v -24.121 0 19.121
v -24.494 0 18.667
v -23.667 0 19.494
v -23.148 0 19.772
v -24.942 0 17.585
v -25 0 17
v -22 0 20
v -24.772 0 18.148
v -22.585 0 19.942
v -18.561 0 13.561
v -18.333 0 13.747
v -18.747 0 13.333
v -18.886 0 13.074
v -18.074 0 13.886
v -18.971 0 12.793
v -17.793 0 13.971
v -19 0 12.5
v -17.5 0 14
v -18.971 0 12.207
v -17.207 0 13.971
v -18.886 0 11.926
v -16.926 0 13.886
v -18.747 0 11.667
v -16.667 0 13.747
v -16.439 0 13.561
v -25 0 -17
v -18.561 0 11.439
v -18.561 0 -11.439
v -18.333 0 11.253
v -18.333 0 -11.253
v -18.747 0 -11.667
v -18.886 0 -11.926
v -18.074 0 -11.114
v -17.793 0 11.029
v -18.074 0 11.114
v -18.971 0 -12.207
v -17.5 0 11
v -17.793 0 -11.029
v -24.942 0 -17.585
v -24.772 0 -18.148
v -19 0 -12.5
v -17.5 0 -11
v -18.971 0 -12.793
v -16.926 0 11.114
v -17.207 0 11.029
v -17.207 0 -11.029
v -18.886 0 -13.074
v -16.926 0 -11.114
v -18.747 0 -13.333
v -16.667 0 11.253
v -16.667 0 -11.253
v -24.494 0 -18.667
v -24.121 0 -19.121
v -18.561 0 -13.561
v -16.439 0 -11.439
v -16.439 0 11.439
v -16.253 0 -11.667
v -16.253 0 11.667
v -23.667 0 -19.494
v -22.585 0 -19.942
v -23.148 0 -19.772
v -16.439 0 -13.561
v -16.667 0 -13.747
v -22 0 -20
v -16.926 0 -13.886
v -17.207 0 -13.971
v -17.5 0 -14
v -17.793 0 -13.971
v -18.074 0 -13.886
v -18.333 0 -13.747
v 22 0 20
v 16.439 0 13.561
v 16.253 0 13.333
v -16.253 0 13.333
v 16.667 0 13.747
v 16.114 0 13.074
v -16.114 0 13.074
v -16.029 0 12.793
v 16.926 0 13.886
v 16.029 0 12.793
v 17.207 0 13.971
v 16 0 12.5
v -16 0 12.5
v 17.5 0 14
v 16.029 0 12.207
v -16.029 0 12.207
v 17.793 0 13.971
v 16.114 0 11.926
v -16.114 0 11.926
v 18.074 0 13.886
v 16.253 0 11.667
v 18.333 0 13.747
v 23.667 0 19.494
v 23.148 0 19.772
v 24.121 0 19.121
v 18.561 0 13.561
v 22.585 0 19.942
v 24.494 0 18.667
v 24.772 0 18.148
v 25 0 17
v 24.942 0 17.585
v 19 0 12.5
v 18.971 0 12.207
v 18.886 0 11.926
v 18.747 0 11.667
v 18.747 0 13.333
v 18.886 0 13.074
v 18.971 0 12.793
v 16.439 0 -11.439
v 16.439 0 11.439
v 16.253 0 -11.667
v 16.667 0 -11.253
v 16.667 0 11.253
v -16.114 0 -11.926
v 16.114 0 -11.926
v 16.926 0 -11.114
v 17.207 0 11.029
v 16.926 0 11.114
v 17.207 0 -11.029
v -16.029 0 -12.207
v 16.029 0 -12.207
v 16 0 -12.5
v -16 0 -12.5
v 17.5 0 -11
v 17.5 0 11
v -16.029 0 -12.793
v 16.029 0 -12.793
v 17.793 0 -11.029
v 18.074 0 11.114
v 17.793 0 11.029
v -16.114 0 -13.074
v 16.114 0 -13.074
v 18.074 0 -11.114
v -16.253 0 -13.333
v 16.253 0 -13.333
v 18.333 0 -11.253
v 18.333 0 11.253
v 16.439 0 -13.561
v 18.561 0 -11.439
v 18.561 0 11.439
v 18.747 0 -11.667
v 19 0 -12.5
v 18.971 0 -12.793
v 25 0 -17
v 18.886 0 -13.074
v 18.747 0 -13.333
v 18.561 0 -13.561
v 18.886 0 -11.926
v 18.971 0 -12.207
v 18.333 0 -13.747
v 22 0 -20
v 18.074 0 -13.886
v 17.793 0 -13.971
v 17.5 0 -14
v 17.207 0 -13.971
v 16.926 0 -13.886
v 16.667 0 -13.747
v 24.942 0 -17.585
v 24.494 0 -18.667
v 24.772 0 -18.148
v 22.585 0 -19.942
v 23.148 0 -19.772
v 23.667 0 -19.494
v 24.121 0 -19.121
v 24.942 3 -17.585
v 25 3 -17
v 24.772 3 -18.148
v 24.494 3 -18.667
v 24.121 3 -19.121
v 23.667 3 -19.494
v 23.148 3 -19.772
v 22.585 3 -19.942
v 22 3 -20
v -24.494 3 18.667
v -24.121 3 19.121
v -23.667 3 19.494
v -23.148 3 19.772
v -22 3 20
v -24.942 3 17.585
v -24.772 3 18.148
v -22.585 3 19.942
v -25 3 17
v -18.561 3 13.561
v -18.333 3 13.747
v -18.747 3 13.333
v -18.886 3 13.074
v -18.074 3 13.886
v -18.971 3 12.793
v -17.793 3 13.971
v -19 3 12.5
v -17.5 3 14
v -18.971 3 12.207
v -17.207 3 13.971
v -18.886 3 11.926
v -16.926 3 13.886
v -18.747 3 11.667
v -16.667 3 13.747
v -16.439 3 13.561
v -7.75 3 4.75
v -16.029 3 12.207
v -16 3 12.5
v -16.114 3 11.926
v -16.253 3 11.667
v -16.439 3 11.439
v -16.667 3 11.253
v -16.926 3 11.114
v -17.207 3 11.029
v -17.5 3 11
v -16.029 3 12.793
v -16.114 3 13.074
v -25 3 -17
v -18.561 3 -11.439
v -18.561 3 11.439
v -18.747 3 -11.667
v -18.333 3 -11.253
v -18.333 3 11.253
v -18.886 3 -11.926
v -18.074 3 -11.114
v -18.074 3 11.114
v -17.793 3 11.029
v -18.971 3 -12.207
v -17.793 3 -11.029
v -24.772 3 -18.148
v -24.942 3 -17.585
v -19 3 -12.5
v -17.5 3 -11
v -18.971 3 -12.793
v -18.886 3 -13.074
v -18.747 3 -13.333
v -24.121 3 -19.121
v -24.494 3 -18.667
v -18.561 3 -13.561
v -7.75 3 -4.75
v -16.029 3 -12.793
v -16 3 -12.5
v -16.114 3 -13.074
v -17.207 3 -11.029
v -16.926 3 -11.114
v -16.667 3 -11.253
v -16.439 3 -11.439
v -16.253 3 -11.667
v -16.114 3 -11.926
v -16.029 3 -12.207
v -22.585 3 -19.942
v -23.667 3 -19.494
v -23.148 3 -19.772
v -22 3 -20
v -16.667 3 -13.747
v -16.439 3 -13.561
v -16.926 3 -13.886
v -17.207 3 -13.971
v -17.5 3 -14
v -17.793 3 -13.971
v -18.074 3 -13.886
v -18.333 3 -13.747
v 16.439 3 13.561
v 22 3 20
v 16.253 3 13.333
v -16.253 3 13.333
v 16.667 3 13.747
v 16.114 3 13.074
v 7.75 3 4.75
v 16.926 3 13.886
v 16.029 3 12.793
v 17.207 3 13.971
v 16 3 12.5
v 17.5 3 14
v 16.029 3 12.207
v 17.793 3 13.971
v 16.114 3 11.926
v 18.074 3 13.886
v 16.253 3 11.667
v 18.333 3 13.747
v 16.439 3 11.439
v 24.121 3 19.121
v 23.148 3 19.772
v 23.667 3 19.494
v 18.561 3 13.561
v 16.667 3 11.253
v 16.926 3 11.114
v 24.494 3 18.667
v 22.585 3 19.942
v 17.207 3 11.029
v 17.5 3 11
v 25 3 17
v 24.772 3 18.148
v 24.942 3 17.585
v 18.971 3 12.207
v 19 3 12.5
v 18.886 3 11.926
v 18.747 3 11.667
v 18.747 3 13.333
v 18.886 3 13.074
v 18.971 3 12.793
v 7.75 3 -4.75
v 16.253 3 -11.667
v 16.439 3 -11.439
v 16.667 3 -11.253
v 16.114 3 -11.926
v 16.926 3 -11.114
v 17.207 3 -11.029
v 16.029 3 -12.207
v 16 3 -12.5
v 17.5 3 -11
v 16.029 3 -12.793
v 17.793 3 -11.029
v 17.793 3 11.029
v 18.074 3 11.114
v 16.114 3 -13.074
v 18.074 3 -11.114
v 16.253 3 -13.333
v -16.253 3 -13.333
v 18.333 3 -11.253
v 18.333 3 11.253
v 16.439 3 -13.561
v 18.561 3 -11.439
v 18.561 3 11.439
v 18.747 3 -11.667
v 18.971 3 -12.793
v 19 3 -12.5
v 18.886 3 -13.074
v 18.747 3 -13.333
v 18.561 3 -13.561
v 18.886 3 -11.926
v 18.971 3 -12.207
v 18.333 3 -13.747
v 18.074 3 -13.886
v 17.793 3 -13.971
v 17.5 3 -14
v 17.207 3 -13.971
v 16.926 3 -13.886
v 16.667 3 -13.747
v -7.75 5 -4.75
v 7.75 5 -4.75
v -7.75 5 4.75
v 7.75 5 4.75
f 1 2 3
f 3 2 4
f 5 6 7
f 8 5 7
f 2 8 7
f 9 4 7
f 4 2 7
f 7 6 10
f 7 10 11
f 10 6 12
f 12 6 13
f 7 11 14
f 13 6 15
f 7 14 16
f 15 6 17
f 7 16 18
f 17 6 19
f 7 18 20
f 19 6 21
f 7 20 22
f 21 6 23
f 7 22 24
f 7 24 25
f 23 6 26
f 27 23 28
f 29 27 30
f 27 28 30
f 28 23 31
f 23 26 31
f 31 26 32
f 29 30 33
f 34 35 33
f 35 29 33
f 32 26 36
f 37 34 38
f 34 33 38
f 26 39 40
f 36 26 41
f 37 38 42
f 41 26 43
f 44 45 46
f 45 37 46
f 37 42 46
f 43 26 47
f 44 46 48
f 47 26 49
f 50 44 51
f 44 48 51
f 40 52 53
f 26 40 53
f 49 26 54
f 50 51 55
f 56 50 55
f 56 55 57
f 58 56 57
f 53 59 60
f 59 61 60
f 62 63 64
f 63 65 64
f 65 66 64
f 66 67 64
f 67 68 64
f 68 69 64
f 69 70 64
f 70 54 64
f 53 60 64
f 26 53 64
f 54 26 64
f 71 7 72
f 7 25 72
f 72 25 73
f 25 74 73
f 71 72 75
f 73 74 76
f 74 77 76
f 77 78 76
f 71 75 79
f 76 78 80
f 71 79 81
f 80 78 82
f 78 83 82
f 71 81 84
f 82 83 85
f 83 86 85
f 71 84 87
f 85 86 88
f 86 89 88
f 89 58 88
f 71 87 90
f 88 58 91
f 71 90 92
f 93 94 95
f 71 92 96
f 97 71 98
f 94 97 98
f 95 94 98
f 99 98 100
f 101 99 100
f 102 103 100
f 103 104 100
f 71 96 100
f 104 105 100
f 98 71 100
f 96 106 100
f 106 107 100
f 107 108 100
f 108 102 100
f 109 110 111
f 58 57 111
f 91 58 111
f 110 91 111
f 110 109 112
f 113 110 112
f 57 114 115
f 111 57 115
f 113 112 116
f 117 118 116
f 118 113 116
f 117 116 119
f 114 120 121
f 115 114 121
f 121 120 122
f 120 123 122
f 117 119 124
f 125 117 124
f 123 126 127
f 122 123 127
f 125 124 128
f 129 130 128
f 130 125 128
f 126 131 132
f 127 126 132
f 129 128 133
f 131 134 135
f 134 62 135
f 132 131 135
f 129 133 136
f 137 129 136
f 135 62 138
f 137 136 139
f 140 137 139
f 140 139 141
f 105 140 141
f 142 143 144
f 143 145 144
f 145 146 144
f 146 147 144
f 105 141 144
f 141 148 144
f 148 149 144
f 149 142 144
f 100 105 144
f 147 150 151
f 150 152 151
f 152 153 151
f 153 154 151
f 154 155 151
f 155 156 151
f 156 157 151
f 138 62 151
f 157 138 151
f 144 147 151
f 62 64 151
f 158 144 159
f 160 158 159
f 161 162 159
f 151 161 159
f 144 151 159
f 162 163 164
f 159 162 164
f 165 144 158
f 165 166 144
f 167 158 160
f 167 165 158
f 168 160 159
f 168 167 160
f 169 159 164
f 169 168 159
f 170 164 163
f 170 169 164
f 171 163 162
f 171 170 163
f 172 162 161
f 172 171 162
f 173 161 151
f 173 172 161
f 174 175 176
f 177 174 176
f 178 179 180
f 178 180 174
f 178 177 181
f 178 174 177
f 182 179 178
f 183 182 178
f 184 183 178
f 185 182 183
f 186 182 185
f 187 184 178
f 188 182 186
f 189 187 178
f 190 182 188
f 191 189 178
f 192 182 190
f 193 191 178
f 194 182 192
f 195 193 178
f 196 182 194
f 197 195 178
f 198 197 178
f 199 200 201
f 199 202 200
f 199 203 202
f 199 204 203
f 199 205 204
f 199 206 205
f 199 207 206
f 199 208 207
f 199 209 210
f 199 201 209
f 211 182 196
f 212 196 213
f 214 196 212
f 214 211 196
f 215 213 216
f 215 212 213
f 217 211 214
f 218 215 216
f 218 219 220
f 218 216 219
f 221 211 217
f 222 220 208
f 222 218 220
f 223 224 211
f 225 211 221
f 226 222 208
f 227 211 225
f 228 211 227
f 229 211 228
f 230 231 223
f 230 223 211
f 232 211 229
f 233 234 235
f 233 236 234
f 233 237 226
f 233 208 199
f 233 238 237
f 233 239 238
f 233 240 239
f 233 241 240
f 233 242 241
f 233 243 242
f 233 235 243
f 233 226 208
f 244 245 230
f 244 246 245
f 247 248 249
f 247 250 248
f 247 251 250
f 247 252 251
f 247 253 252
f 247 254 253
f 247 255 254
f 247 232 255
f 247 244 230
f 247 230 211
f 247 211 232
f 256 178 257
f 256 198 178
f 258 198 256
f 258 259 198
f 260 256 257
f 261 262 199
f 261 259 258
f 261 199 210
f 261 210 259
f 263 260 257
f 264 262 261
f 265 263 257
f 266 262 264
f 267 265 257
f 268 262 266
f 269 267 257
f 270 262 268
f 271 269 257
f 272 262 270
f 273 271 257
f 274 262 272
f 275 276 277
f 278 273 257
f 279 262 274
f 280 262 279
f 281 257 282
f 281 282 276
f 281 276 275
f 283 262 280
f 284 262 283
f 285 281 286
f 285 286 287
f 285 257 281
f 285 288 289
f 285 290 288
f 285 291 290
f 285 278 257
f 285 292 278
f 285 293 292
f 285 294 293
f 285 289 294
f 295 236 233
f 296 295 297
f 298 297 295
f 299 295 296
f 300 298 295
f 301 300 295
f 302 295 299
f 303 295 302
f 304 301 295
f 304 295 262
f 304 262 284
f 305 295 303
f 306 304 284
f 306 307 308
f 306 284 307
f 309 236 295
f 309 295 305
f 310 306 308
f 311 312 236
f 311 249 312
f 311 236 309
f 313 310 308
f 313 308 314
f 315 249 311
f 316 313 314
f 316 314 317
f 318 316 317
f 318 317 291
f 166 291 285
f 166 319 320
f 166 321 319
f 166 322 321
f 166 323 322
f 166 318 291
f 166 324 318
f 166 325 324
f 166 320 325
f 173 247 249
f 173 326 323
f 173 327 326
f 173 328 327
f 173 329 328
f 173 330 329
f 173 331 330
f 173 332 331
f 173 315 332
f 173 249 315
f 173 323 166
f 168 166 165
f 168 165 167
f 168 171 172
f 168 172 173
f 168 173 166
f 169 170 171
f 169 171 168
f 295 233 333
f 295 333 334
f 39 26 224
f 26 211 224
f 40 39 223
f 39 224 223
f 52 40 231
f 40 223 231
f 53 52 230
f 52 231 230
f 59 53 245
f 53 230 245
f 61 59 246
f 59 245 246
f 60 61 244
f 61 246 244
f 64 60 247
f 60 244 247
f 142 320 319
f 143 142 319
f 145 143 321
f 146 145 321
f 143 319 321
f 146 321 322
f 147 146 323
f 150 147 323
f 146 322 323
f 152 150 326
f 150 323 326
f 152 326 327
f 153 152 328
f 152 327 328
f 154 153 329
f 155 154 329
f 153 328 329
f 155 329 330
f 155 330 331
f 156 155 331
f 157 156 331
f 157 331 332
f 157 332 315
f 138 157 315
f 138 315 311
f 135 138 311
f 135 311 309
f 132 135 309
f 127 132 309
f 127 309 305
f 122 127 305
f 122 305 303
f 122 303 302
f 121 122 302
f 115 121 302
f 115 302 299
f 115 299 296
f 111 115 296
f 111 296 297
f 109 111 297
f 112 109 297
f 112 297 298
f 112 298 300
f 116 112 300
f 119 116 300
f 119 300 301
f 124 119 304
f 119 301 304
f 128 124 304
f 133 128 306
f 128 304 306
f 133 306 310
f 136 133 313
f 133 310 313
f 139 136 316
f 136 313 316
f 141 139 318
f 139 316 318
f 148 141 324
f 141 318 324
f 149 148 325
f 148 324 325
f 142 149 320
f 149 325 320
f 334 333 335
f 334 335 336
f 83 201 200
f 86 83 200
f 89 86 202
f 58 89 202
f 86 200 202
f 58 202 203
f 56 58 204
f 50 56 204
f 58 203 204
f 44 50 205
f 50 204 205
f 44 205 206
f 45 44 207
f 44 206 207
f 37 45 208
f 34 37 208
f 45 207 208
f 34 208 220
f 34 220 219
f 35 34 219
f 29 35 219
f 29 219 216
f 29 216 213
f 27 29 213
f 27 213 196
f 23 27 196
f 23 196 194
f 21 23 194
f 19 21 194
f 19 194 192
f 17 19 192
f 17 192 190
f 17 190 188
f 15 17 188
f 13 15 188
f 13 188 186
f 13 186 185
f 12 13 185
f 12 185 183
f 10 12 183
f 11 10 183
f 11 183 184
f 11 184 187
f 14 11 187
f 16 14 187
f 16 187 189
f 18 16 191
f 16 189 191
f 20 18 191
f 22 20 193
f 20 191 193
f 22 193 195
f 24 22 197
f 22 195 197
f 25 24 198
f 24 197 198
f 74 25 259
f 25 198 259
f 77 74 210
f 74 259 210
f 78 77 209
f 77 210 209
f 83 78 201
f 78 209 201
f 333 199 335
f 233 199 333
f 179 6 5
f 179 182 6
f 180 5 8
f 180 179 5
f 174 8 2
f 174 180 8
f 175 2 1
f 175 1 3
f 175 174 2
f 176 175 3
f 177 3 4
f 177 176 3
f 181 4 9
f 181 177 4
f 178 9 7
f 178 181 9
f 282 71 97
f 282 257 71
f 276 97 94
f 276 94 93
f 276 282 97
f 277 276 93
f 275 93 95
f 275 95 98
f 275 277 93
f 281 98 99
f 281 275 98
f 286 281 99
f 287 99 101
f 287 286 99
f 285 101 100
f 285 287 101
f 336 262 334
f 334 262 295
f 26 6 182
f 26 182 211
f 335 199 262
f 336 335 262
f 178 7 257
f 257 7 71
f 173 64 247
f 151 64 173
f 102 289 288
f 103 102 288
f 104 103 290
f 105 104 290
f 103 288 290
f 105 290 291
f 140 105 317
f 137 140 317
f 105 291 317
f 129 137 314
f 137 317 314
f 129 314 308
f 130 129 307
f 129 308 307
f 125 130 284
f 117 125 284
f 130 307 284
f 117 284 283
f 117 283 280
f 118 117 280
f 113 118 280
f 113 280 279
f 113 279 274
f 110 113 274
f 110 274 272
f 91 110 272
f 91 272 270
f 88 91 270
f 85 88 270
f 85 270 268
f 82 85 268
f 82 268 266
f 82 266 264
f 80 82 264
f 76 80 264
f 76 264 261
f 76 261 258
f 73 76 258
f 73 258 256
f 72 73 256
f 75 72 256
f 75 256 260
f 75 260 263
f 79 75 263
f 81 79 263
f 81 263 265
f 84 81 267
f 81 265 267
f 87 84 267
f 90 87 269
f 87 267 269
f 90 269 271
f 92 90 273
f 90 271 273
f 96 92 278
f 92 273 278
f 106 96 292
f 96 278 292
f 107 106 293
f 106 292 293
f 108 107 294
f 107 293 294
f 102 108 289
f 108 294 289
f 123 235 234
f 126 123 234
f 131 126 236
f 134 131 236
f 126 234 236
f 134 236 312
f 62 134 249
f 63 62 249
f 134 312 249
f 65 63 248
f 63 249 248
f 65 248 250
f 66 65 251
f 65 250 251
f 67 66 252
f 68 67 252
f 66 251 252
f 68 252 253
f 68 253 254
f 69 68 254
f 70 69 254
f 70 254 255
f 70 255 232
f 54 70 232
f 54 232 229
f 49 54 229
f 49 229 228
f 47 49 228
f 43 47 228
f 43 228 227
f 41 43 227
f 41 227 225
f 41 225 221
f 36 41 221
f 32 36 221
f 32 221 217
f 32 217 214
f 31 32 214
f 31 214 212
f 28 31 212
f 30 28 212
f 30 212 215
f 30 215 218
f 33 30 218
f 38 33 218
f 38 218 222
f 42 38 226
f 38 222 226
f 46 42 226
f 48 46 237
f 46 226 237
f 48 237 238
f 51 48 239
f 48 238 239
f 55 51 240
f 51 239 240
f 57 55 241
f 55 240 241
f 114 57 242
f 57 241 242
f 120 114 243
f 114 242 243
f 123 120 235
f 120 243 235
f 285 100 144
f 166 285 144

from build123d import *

# Parameters (mm, degrees)
SKETCH1_W     = 50
SKETCH1_H     = 40
BODY_DEPTH    = 3
FILLET_BODY_R = 3
SKETCH2_R     = 1.5
BOLTS_DEPTH   = 9
SKETCH3_W     = 15.5
SKETCH3_H     = 9.5
CHANNEL_DEPTH = 2


with BuildPart() as part:
    # Sketch1 → Body (new body)
    with BuildSketch(Plane(origin=(0, 0, 0), x_dir=(1, 0, 0), z_dir=(0, 1, 0))):
        Rectangle(SKETCH1_W, SKETCH1_H)
    extrude(amount=BODY_DEPTH)

    # Fillet_Body
    fillet_body_edges = [part.edges().sort_by_distance(p)[0] for p in [
        (-25, 1.5, -20),
        (25, 1.5, -20),
        (25, 1.5, 20),
        (-25, 1.5, 20),
    ]]
    fillet(fillet_body_edges, radius=FILLET_BODY_R)

    # Sketch2 → Bolts (cut)
    with BuildSketch(Plane(origin=(0, 3, 0), x_dir=(1, 0, 0), z_dir=(0, 1, 0))):
        with Locations((-17.5, 12.5)):
            Circle(SKETCH2_R)
        with Locations((17.5, 12.5)):
            Circle(SKETCH2_R)
        with Locations((17.5, -12.5)):
            Circle(SKETCH2_R)
        with Locations((-17.5, -12.5)):
            Circle(SKETCH2_R)
    extrude(amount=-BOLTS_DEPTH, mode=Mode.SUBTRACT)

    # Sketch3 → Channel (add)
    with BuildSketch(Plane(origin=(0, 3, 0), x_dir=(1, 0, 0), z_dir=(0, 1, 0))):
        Rectangle(SKETCH3_W, SKETCH3_H)
    extrude(amount=CHANNEL_DEPTH)


solid = part.part
